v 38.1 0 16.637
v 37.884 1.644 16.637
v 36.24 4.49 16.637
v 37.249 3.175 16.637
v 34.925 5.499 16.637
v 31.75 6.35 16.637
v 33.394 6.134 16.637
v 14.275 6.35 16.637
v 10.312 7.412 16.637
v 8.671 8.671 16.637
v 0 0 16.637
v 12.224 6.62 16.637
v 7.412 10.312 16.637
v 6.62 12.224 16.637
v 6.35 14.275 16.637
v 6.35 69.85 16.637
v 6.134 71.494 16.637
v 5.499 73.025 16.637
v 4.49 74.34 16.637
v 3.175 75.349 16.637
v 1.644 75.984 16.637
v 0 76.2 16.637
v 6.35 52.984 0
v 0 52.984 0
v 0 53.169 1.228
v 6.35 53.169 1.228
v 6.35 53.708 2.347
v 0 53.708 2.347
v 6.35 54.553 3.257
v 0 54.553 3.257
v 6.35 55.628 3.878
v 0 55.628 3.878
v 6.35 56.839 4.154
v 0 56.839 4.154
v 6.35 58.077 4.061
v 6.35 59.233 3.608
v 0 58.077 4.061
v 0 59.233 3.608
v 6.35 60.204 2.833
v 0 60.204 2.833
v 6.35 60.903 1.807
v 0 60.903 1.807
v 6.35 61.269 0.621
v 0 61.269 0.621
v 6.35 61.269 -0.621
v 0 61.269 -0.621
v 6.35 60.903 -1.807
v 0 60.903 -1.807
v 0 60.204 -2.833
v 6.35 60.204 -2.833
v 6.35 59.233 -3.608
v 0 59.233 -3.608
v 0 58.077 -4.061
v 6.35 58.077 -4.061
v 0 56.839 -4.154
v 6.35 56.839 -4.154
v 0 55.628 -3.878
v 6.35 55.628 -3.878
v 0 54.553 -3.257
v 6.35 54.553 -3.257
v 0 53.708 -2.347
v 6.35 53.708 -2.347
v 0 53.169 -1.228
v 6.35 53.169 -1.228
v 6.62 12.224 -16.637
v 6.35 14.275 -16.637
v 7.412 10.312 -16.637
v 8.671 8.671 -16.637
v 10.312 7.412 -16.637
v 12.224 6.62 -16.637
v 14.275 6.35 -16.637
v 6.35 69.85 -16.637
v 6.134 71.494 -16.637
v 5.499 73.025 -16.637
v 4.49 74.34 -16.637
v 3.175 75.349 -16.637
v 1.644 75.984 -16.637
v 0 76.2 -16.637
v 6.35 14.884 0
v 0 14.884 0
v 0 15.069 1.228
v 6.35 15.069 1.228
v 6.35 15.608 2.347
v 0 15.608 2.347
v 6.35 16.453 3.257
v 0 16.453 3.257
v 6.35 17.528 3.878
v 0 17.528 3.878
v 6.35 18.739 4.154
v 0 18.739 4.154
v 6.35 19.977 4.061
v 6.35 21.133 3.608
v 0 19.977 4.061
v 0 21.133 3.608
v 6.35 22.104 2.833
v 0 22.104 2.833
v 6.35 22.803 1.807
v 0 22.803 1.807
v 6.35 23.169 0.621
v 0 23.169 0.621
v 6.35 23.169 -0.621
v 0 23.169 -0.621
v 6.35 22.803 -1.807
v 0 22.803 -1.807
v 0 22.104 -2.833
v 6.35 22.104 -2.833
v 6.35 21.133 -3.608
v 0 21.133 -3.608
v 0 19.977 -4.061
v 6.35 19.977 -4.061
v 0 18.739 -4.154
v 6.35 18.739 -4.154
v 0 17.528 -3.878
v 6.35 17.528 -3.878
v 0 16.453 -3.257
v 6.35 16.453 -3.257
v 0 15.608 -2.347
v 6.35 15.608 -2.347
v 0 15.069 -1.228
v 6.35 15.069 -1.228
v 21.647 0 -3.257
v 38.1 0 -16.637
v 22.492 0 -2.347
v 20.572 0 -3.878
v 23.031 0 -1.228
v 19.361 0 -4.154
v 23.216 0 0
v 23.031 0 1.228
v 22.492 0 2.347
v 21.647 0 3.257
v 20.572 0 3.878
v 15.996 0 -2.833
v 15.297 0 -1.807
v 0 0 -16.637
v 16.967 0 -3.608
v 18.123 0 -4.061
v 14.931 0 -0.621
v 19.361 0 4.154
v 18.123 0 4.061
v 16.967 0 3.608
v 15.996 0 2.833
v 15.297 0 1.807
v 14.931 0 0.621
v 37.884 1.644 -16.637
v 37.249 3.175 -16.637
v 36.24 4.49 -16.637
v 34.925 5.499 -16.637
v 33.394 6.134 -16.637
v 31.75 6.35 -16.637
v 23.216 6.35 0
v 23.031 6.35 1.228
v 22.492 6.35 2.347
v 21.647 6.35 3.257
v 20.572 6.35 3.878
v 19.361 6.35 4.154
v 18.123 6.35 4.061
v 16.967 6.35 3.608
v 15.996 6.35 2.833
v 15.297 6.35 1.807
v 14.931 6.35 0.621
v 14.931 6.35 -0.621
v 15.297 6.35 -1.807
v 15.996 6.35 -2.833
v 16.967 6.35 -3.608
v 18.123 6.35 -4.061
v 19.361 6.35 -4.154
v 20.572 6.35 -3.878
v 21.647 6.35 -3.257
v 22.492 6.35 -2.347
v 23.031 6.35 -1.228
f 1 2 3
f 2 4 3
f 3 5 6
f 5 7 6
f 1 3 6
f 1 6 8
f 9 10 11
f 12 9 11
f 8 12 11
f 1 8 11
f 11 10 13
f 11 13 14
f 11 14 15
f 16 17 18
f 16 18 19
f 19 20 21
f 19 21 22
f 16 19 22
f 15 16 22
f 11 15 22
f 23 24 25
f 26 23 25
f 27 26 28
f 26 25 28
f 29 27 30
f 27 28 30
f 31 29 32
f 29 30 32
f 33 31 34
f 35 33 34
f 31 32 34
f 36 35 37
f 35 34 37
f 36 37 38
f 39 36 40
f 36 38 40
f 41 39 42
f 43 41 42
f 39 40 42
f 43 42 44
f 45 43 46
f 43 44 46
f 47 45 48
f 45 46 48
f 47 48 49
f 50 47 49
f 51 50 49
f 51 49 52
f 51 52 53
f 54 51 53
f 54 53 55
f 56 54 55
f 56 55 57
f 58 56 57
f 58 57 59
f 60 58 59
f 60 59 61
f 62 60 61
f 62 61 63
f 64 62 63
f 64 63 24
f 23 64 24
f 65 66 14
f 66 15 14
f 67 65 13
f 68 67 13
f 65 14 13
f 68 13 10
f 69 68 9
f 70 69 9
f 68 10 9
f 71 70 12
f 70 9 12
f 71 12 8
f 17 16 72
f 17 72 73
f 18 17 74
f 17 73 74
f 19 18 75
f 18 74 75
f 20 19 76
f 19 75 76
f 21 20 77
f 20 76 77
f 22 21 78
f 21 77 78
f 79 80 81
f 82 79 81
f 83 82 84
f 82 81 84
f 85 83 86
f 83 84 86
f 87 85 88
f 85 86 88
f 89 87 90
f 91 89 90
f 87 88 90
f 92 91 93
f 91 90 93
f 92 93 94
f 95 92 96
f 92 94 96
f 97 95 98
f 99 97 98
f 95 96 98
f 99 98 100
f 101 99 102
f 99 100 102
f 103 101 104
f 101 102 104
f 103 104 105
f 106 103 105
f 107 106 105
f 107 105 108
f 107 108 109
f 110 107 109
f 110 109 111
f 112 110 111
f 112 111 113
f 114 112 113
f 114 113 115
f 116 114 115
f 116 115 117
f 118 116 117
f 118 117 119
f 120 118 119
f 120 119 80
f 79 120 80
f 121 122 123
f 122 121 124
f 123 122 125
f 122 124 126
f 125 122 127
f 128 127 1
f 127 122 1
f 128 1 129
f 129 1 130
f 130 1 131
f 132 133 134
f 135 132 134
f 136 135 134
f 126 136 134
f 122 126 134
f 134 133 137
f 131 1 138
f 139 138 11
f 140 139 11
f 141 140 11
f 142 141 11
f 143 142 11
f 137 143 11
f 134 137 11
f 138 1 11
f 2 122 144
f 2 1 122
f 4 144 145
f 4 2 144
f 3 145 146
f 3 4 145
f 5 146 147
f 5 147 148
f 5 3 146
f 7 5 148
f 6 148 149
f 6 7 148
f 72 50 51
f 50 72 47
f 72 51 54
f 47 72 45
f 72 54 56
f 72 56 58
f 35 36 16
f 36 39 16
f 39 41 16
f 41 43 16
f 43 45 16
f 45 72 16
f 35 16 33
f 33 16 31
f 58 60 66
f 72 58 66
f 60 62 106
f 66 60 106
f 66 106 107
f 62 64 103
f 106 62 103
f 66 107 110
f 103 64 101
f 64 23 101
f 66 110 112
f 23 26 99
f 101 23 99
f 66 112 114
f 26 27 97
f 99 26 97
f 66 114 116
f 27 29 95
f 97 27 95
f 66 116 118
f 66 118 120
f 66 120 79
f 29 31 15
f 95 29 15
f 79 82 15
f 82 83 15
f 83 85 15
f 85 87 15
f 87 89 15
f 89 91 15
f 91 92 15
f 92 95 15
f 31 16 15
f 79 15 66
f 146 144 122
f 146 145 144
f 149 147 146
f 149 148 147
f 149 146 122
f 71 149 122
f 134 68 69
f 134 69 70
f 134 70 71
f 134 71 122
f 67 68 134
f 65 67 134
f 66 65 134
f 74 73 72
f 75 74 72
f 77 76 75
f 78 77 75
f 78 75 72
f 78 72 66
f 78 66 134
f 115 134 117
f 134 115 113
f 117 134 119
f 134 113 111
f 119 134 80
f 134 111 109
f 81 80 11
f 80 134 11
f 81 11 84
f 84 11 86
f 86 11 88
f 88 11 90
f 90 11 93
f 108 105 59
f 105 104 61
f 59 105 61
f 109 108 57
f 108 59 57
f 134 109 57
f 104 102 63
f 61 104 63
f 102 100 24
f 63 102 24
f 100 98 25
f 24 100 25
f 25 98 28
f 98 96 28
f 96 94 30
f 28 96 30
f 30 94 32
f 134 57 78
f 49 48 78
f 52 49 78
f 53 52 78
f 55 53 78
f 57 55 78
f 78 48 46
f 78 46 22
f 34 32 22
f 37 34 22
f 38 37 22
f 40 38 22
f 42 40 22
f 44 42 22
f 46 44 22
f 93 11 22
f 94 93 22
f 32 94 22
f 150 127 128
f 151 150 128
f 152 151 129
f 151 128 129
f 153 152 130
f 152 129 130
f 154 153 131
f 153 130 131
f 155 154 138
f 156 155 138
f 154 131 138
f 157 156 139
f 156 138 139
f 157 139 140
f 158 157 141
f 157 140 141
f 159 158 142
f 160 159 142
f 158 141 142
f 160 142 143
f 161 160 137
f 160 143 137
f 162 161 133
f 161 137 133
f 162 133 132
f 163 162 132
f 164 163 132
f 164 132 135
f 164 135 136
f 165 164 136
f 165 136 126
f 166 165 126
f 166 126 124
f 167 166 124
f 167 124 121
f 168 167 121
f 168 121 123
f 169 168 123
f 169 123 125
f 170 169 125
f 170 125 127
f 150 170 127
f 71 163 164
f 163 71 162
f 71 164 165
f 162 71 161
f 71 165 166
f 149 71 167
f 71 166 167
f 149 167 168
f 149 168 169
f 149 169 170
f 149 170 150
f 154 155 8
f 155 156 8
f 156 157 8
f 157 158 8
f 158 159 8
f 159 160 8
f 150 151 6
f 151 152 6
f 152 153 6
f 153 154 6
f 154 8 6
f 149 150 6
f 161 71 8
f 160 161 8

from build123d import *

# Parameters (mm, degrees)
BOSS_EXTRUDE1_DEPTH = 16.637
FILLET1_R           = 6.35
SKETCH3_R           = 4.1656
CUT_EXTRUDE1_DEPTH  = 87.803454822
SKETCH4_R           = 4.1656
CUT_EXTRUDE2_DEPTH  = 87.803454822


with BuildPart() as part:
    # Sketch2 → Boss-Extrude1 (new, symmetric)
    with BuildSketch(Plane.XY):
        with BuildLine():
            Line((0, 0), (0, 76.2))
            Line((0, 76.2), (6.35, 76.2))
            Line((6.35, 76.2), (6.35, 14.2748))
            ThreePointArc((6.35, 14.2748), (8.67112018, 8.67112018), (14.2748, 6.35))
            Line((14.2748, 6.35), (38.1, 6.35))
            Line((38.1, 6.35), (38.1, 0))
            Line((38.1, 0), (0, 0))
        make_face()
    extrude(amount=BOSS_EXTRUDE1_DEPTH, both=True)

    # Fillet1
    fillet1_edges = [part.edges().sort_by_distance(p)[0] for p in [
        (38.1, 6.35, 0),
        (6.35, 76.2, 0),
    ]]
    fillet(fillet1_edges, radius=FILLET1_R - 0.0001)  # a hair under: the kernel refuses the full size

    # Sketch3 → Cut-Extrude1 (cut, through all)
    with BuildSketch(Plane.ZY):
        with Locations(Location((0, 57.15, 0), (0, 0, 270))):
            Circle(SKETCH3_R)
        with Locations(Location((0, 19.05, 0), (0, 0, 270))):
            Circle(SKETCH3_R)
    extrude(amount=-CUT_EXTRUDE1_DEPTH, mode=Mode.SUBTRACT)

    # Sketch4 → Cut-Extrude2 (cut, through all)
    with BuildSketch(Plane.XZ):
        with Locations((19.05, 0)):
            Circle(SKETCH4_R)
    extrude(amount=-CUT_EXTRUDE2_DEPTH, mode=Mode.SUBTRACT)


solid = part.part
